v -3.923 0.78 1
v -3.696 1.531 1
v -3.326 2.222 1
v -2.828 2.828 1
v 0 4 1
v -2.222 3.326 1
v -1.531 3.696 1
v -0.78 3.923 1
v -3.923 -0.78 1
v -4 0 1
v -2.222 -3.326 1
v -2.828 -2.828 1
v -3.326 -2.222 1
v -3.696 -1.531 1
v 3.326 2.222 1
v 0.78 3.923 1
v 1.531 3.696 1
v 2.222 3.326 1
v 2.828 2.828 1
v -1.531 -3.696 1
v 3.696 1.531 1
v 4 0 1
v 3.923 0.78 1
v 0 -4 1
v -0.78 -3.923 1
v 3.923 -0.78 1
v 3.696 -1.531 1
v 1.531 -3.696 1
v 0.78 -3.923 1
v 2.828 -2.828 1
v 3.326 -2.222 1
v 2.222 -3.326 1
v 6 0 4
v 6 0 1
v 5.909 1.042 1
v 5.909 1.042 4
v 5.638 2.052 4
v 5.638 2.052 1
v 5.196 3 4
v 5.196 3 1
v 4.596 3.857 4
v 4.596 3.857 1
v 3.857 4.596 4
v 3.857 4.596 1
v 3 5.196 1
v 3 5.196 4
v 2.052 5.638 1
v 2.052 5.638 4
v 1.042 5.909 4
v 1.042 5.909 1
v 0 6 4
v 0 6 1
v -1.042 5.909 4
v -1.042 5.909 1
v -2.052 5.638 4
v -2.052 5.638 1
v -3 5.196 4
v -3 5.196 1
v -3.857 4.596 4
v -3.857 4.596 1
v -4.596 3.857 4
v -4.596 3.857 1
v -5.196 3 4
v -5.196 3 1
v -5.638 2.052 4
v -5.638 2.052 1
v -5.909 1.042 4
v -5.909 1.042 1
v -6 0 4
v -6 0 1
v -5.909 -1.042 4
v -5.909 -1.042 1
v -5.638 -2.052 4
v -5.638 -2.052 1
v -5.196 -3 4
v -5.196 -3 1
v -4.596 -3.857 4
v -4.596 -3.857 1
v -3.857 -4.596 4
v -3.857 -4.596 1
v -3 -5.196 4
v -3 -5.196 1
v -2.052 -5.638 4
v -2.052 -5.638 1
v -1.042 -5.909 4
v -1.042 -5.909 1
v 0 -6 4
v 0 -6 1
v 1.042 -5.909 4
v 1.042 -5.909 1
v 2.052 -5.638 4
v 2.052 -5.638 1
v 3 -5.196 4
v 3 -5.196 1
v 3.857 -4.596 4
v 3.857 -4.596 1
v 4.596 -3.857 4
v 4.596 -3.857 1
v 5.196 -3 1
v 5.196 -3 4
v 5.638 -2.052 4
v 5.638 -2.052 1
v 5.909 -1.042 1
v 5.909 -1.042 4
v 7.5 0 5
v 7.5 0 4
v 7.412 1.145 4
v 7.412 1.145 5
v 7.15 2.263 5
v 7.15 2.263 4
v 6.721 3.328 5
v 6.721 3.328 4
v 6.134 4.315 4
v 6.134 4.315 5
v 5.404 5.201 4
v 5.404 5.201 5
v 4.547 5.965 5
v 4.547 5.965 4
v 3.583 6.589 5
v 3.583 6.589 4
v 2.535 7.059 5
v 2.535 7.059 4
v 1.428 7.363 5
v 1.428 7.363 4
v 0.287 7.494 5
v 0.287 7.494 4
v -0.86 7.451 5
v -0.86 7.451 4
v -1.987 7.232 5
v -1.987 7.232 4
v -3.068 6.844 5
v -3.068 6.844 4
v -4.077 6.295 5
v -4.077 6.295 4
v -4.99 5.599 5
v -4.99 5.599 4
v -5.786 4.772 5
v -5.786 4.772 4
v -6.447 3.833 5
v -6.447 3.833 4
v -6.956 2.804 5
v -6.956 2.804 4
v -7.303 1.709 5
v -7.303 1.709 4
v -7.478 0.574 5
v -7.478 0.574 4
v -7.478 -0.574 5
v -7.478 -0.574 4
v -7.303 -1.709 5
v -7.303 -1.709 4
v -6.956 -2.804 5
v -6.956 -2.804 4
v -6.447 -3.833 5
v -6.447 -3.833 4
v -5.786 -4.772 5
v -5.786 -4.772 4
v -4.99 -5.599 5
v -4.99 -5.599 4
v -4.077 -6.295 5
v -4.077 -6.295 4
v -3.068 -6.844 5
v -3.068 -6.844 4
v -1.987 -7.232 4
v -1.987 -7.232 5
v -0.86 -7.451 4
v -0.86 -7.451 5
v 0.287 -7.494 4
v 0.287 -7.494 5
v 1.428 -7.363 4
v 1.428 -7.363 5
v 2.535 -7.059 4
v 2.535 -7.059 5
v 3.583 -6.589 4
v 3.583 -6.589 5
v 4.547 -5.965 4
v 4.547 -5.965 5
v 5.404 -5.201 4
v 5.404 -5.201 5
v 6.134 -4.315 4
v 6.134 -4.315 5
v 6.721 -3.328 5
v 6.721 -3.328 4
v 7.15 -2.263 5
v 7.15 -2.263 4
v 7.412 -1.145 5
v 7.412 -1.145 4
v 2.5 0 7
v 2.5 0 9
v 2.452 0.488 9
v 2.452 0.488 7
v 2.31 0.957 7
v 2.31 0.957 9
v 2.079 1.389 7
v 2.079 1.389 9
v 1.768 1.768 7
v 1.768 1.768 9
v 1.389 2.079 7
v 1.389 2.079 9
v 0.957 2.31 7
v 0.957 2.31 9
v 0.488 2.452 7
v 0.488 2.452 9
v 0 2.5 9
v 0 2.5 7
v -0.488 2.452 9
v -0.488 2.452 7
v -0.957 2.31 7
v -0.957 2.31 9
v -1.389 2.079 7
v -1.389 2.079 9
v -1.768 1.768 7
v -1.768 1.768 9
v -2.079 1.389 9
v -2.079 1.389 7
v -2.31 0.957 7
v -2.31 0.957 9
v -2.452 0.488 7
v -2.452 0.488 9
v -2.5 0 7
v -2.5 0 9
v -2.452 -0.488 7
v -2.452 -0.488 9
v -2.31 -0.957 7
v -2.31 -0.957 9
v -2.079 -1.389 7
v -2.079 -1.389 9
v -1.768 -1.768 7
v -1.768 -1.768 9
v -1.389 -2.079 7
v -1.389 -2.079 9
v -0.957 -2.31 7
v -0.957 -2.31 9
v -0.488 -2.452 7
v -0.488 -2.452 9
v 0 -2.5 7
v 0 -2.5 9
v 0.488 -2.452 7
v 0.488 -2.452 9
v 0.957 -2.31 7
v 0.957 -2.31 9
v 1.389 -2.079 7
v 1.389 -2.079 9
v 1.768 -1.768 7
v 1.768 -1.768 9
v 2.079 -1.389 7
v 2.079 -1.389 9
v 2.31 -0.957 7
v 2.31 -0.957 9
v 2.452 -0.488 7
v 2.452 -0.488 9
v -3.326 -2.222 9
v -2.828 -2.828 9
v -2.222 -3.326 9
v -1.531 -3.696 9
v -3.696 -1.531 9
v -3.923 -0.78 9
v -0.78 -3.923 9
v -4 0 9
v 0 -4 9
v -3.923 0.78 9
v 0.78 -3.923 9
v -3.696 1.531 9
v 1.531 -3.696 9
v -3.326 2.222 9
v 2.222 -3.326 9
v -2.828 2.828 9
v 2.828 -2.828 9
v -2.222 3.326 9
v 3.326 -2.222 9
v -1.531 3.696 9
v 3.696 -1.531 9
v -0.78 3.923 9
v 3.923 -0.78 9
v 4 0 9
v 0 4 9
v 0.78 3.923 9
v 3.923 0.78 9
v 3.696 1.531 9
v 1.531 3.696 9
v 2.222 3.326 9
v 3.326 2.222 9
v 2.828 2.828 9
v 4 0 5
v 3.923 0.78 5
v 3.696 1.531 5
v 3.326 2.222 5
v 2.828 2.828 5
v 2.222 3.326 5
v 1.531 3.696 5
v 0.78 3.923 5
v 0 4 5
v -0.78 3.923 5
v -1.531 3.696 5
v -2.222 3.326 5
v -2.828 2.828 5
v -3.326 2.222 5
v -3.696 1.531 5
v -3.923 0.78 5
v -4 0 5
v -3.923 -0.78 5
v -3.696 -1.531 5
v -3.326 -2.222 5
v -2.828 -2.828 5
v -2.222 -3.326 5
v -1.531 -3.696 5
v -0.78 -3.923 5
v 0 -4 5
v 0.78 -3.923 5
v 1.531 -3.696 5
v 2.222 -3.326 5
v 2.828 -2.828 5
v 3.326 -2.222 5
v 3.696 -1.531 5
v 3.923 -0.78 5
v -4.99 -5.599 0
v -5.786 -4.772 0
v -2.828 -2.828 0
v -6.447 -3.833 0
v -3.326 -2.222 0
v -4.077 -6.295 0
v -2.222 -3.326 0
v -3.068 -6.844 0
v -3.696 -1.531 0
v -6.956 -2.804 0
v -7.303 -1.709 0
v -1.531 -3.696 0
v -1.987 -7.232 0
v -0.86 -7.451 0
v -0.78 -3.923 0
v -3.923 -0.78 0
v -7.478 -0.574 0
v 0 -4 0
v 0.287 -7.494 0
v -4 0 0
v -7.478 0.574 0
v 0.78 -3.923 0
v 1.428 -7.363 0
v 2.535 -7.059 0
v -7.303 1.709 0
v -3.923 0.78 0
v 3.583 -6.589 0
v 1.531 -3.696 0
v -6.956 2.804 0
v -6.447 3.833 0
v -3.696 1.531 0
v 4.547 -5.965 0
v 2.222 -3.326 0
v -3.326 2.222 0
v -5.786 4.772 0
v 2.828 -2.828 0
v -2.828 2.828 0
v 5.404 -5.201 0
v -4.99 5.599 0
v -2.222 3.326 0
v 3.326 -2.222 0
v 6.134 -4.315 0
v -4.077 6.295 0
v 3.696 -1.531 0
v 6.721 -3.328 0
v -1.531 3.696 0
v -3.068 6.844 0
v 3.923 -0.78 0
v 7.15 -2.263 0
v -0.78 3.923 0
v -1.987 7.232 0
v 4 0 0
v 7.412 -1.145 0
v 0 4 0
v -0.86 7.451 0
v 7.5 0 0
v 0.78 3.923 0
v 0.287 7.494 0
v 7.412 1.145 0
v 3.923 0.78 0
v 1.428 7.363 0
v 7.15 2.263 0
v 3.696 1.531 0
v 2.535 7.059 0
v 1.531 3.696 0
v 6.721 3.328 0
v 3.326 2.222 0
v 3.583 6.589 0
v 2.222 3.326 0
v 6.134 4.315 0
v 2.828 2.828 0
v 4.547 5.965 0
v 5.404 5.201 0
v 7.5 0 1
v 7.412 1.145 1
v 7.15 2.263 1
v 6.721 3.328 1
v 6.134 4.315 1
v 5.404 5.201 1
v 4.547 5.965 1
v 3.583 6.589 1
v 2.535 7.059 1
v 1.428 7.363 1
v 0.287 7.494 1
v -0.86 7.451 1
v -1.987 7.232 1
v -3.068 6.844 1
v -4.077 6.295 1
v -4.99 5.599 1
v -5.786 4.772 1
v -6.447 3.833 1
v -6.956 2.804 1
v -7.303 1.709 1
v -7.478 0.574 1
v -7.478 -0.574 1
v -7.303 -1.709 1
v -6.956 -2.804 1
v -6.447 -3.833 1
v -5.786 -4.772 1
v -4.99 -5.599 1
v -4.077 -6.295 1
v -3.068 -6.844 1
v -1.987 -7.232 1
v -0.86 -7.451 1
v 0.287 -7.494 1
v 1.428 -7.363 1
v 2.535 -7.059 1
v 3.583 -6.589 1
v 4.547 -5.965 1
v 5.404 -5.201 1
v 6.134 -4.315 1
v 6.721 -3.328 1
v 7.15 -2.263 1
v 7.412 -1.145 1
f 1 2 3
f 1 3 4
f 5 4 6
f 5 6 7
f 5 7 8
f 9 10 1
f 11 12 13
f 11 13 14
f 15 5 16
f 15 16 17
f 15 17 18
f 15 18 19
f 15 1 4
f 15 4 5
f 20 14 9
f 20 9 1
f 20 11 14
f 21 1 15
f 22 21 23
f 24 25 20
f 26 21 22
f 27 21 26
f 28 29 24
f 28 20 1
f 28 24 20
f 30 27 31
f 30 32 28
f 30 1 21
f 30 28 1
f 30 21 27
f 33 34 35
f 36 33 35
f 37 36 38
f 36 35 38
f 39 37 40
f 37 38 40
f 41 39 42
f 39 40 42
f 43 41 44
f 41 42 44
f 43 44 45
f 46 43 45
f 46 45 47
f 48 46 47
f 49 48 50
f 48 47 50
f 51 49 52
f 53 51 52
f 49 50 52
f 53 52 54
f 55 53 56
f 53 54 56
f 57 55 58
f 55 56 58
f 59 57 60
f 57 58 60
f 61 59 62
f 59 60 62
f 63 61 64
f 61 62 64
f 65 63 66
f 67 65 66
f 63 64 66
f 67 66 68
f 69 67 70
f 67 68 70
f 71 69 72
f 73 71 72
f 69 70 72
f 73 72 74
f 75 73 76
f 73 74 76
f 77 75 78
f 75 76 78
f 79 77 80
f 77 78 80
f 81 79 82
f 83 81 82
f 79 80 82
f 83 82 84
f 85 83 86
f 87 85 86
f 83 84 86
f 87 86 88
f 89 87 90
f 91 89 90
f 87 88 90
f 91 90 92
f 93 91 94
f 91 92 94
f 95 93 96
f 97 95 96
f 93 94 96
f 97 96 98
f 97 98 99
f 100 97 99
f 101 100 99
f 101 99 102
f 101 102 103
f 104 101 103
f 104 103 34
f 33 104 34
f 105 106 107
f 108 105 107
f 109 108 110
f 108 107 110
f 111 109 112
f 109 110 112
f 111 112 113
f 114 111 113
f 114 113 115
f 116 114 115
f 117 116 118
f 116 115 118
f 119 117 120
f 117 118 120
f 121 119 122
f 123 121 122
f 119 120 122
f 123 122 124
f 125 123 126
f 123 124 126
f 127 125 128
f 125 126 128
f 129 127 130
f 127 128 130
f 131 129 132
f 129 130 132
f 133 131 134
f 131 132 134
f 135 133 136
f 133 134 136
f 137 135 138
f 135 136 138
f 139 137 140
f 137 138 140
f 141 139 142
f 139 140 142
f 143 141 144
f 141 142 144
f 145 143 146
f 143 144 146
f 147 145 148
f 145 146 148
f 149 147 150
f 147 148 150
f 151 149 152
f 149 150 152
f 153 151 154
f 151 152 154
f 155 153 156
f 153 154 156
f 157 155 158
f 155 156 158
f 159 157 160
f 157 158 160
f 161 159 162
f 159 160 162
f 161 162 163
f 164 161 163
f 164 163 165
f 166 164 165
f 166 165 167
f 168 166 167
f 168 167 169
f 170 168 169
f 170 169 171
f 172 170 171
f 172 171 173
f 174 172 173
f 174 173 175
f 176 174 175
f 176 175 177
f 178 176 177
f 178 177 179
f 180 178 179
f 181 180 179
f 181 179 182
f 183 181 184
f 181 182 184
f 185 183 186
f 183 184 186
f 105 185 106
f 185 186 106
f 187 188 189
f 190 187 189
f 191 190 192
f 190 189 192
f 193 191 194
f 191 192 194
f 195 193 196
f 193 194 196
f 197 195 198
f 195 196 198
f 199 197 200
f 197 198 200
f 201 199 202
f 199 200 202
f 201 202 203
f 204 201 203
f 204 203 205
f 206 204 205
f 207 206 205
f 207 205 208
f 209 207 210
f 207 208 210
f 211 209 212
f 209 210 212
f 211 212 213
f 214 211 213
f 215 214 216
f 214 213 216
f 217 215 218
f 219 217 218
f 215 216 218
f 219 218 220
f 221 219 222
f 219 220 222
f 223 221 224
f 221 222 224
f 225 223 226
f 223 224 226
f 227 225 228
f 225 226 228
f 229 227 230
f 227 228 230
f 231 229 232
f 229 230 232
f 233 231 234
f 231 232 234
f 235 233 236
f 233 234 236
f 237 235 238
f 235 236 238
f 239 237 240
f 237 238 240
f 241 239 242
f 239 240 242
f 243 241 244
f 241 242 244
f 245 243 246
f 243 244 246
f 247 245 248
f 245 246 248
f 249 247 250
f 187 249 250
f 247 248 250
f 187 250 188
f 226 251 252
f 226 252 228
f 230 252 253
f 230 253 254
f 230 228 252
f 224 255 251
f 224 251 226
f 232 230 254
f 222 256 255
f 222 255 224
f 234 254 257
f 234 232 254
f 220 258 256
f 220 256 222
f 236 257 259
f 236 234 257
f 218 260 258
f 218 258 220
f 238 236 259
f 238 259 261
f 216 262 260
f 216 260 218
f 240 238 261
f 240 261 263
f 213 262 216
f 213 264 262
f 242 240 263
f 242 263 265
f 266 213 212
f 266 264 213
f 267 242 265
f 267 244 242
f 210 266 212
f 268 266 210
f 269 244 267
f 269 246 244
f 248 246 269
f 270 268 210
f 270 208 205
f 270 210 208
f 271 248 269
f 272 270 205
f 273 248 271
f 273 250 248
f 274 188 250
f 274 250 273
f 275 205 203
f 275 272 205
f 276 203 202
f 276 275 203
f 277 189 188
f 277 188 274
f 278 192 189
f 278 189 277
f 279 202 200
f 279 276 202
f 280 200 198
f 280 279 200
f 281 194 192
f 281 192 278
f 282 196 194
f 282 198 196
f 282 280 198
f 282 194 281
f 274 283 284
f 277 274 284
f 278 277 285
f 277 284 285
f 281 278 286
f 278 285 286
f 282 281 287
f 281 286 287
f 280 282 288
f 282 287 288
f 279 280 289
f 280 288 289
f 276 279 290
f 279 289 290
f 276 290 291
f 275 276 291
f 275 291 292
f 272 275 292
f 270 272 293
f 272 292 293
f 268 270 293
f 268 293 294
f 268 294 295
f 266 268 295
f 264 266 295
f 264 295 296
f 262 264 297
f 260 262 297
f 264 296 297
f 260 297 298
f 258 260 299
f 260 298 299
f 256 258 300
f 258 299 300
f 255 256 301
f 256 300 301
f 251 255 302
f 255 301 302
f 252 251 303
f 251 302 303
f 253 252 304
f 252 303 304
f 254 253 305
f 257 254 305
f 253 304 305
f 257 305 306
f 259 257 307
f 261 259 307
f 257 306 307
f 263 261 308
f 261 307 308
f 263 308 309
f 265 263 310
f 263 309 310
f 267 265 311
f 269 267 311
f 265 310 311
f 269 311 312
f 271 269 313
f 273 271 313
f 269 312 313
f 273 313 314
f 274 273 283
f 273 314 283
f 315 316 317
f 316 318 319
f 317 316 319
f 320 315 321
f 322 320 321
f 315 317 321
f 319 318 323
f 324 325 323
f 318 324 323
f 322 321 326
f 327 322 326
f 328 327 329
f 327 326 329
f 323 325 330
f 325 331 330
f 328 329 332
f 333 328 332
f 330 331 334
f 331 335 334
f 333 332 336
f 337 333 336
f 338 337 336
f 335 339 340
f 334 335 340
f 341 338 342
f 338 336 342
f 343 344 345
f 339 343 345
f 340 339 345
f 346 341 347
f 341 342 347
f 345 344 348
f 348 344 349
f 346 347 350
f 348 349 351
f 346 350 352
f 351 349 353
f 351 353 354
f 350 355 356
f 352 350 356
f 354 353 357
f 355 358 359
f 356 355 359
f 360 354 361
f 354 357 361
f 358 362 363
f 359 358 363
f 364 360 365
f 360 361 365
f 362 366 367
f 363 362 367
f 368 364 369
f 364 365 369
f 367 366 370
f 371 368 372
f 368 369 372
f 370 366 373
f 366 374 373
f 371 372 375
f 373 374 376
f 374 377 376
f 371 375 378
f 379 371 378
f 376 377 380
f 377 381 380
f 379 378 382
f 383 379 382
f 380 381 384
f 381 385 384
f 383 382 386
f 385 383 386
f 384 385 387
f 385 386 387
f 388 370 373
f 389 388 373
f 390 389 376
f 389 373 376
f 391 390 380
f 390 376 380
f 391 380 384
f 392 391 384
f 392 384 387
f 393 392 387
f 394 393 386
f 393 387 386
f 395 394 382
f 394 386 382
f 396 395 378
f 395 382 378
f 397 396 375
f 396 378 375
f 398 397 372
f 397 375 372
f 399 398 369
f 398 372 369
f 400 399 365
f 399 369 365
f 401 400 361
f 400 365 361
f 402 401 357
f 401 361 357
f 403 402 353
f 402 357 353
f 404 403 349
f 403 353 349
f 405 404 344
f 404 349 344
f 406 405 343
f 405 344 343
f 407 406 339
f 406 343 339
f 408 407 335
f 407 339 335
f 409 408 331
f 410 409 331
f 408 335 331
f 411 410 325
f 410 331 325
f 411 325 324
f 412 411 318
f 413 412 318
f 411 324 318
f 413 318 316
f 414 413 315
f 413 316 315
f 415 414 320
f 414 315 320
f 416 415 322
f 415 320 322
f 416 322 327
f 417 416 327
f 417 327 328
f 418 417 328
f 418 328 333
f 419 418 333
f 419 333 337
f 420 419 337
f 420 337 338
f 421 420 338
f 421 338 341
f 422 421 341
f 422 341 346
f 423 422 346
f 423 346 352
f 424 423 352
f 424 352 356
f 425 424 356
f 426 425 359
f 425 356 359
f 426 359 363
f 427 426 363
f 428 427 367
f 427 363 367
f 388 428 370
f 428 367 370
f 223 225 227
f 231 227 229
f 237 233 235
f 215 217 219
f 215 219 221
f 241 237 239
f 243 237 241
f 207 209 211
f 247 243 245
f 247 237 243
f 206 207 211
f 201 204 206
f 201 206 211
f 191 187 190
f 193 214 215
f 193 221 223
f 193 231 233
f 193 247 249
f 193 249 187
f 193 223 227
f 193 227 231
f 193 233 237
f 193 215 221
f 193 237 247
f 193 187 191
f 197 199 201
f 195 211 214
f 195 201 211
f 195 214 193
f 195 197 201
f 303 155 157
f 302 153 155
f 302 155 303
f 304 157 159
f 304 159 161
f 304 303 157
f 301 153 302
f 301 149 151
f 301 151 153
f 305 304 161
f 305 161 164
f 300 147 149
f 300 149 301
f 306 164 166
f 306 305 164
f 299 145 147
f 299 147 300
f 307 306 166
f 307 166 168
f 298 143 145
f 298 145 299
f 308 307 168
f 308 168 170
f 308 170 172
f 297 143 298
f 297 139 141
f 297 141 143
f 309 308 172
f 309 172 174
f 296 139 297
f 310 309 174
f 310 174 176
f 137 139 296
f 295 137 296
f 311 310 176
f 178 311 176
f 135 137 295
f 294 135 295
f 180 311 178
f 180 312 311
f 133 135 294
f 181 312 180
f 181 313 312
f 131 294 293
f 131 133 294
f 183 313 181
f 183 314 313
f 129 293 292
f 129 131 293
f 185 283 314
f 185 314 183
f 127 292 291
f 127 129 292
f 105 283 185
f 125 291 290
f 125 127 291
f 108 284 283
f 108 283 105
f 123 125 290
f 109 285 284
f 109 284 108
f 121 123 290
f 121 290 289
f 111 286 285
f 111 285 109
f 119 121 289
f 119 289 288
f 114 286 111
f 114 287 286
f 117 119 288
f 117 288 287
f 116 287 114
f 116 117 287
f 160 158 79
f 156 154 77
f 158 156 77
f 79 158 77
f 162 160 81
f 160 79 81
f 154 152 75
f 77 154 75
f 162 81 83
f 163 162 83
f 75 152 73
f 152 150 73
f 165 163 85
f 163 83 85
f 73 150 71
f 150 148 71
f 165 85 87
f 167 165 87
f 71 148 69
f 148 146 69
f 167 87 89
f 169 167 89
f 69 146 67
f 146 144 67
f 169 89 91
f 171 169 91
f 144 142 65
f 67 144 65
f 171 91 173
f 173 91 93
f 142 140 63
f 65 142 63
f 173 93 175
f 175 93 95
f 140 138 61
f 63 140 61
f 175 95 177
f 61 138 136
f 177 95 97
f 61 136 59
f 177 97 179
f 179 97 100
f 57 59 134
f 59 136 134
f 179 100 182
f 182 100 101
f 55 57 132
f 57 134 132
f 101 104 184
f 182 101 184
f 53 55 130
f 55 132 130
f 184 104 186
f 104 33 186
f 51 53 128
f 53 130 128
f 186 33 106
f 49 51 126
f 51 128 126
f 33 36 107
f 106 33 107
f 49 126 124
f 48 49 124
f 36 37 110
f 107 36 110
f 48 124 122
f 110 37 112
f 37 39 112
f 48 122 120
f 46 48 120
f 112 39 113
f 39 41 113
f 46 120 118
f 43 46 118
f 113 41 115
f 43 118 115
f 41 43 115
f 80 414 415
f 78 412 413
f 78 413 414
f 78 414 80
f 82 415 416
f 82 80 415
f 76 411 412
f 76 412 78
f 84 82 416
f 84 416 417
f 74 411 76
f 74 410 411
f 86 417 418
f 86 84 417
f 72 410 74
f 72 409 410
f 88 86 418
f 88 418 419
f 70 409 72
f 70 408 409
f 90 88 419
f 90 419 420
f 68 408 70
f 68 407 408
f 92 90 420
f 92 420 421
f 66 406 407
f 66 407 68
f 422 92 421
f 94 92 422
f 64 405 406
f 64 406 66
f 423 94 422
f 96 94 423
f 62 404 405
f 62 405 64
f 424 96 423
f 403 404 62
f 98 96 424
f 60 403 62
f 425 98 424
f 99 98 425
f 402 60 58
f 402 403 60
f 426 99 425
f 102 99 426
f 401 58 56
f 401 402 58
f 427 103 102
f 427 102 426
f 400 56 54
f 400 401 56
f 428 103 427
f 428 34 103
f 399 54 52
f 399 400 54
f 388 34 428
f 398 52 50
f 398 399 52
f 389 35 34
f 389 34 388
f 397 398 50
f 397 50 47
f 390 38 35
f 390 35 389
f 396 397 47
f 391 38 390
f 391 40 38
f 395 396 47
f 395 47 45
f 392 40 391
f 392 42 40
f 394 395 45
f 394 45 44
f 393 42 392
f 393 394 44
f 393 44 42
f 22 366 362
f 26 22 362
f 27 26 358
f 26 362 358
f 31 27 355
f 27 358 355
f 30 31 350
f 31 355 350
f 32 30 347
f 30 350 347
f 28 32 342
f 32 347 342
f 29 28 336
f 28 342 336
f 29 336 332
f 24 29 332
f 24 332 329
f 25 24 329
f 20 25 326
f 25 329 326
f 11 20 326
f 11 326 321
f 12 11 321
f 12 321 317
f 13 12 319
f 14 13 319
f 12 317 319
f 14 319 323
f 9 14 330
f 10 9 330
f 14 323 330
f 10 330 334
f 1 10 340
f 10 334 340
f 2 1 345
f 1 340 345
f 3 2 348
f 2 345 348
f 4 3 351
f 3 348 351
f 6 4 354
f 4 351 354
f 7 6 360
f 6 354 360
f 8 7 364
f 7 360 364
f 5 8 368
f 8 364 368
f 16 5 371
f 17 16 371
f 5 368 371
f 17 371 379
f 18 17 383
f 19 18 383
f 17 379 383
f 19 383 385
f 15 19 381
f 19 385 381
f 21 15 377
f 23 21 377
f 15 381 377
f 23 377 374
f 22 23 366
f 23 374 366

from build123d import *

# Parameters (mm, degrees)
F0_R      = 7.5
F1_DEPTH  = 1
F2_R      = 6
F3_DEPTH  = 3
F4_R      = 7.5
F4_R_2    = 6
F5_DEPTH  = 1
F7_R      = 4
F8_DEPTH  = 4
F9_R      = 2.5
F10_DEPTH = 2
F11_R     = 4
F12_DEPTH = 1


with BuildPart() as f1:
    # F0 (on Top) → F1 (new body)
    with BuildSketch(Plane.XY):
        Circle(F0_R)
    extrude(amount=F1_DEPTH)

    # F2 (on face) → F3 (join)
    with BuildSketch(Plane.XY.offset(1)):
        Circle(F2_R)
    extrude(amount=F3_DEPTH)

    # F4 (on face) → F5 (join)
    with BuildSketch(Plane.XY.offset(4)):
        Circle(F4_R)
        Circle(F4_R_2, mode=Mode.SUBTRACT)
        Circle(F4_R_2)
    extrude(amount=F5_DEPTH)

    # F7 (on face) → F8 (join)
    with BuildSketch(Plane.XY.offset(5)):
        Circle(F7_R)
    extrude(amount=F8_DEPTH)

    # F9 (on face) → F10 (cut)
    with BuildSketch(Plane.XY.offset(9)):
        Circle(F9_R)
    extrude(amount=-F10_DEPTH, mode=Mode.SUBTRACT)

    # F11 (on face) → F12 (cut)
    with BuildSketch(Plane(origin=(0, 0, 0), x_dir=(1, 0, 0), z_dir=(0, 0, -1))):
        Circle(F11_R)
    extrude(amount=-F12_DEPTH, mode=Mode.SUBTRACT)


solid = f1.part
